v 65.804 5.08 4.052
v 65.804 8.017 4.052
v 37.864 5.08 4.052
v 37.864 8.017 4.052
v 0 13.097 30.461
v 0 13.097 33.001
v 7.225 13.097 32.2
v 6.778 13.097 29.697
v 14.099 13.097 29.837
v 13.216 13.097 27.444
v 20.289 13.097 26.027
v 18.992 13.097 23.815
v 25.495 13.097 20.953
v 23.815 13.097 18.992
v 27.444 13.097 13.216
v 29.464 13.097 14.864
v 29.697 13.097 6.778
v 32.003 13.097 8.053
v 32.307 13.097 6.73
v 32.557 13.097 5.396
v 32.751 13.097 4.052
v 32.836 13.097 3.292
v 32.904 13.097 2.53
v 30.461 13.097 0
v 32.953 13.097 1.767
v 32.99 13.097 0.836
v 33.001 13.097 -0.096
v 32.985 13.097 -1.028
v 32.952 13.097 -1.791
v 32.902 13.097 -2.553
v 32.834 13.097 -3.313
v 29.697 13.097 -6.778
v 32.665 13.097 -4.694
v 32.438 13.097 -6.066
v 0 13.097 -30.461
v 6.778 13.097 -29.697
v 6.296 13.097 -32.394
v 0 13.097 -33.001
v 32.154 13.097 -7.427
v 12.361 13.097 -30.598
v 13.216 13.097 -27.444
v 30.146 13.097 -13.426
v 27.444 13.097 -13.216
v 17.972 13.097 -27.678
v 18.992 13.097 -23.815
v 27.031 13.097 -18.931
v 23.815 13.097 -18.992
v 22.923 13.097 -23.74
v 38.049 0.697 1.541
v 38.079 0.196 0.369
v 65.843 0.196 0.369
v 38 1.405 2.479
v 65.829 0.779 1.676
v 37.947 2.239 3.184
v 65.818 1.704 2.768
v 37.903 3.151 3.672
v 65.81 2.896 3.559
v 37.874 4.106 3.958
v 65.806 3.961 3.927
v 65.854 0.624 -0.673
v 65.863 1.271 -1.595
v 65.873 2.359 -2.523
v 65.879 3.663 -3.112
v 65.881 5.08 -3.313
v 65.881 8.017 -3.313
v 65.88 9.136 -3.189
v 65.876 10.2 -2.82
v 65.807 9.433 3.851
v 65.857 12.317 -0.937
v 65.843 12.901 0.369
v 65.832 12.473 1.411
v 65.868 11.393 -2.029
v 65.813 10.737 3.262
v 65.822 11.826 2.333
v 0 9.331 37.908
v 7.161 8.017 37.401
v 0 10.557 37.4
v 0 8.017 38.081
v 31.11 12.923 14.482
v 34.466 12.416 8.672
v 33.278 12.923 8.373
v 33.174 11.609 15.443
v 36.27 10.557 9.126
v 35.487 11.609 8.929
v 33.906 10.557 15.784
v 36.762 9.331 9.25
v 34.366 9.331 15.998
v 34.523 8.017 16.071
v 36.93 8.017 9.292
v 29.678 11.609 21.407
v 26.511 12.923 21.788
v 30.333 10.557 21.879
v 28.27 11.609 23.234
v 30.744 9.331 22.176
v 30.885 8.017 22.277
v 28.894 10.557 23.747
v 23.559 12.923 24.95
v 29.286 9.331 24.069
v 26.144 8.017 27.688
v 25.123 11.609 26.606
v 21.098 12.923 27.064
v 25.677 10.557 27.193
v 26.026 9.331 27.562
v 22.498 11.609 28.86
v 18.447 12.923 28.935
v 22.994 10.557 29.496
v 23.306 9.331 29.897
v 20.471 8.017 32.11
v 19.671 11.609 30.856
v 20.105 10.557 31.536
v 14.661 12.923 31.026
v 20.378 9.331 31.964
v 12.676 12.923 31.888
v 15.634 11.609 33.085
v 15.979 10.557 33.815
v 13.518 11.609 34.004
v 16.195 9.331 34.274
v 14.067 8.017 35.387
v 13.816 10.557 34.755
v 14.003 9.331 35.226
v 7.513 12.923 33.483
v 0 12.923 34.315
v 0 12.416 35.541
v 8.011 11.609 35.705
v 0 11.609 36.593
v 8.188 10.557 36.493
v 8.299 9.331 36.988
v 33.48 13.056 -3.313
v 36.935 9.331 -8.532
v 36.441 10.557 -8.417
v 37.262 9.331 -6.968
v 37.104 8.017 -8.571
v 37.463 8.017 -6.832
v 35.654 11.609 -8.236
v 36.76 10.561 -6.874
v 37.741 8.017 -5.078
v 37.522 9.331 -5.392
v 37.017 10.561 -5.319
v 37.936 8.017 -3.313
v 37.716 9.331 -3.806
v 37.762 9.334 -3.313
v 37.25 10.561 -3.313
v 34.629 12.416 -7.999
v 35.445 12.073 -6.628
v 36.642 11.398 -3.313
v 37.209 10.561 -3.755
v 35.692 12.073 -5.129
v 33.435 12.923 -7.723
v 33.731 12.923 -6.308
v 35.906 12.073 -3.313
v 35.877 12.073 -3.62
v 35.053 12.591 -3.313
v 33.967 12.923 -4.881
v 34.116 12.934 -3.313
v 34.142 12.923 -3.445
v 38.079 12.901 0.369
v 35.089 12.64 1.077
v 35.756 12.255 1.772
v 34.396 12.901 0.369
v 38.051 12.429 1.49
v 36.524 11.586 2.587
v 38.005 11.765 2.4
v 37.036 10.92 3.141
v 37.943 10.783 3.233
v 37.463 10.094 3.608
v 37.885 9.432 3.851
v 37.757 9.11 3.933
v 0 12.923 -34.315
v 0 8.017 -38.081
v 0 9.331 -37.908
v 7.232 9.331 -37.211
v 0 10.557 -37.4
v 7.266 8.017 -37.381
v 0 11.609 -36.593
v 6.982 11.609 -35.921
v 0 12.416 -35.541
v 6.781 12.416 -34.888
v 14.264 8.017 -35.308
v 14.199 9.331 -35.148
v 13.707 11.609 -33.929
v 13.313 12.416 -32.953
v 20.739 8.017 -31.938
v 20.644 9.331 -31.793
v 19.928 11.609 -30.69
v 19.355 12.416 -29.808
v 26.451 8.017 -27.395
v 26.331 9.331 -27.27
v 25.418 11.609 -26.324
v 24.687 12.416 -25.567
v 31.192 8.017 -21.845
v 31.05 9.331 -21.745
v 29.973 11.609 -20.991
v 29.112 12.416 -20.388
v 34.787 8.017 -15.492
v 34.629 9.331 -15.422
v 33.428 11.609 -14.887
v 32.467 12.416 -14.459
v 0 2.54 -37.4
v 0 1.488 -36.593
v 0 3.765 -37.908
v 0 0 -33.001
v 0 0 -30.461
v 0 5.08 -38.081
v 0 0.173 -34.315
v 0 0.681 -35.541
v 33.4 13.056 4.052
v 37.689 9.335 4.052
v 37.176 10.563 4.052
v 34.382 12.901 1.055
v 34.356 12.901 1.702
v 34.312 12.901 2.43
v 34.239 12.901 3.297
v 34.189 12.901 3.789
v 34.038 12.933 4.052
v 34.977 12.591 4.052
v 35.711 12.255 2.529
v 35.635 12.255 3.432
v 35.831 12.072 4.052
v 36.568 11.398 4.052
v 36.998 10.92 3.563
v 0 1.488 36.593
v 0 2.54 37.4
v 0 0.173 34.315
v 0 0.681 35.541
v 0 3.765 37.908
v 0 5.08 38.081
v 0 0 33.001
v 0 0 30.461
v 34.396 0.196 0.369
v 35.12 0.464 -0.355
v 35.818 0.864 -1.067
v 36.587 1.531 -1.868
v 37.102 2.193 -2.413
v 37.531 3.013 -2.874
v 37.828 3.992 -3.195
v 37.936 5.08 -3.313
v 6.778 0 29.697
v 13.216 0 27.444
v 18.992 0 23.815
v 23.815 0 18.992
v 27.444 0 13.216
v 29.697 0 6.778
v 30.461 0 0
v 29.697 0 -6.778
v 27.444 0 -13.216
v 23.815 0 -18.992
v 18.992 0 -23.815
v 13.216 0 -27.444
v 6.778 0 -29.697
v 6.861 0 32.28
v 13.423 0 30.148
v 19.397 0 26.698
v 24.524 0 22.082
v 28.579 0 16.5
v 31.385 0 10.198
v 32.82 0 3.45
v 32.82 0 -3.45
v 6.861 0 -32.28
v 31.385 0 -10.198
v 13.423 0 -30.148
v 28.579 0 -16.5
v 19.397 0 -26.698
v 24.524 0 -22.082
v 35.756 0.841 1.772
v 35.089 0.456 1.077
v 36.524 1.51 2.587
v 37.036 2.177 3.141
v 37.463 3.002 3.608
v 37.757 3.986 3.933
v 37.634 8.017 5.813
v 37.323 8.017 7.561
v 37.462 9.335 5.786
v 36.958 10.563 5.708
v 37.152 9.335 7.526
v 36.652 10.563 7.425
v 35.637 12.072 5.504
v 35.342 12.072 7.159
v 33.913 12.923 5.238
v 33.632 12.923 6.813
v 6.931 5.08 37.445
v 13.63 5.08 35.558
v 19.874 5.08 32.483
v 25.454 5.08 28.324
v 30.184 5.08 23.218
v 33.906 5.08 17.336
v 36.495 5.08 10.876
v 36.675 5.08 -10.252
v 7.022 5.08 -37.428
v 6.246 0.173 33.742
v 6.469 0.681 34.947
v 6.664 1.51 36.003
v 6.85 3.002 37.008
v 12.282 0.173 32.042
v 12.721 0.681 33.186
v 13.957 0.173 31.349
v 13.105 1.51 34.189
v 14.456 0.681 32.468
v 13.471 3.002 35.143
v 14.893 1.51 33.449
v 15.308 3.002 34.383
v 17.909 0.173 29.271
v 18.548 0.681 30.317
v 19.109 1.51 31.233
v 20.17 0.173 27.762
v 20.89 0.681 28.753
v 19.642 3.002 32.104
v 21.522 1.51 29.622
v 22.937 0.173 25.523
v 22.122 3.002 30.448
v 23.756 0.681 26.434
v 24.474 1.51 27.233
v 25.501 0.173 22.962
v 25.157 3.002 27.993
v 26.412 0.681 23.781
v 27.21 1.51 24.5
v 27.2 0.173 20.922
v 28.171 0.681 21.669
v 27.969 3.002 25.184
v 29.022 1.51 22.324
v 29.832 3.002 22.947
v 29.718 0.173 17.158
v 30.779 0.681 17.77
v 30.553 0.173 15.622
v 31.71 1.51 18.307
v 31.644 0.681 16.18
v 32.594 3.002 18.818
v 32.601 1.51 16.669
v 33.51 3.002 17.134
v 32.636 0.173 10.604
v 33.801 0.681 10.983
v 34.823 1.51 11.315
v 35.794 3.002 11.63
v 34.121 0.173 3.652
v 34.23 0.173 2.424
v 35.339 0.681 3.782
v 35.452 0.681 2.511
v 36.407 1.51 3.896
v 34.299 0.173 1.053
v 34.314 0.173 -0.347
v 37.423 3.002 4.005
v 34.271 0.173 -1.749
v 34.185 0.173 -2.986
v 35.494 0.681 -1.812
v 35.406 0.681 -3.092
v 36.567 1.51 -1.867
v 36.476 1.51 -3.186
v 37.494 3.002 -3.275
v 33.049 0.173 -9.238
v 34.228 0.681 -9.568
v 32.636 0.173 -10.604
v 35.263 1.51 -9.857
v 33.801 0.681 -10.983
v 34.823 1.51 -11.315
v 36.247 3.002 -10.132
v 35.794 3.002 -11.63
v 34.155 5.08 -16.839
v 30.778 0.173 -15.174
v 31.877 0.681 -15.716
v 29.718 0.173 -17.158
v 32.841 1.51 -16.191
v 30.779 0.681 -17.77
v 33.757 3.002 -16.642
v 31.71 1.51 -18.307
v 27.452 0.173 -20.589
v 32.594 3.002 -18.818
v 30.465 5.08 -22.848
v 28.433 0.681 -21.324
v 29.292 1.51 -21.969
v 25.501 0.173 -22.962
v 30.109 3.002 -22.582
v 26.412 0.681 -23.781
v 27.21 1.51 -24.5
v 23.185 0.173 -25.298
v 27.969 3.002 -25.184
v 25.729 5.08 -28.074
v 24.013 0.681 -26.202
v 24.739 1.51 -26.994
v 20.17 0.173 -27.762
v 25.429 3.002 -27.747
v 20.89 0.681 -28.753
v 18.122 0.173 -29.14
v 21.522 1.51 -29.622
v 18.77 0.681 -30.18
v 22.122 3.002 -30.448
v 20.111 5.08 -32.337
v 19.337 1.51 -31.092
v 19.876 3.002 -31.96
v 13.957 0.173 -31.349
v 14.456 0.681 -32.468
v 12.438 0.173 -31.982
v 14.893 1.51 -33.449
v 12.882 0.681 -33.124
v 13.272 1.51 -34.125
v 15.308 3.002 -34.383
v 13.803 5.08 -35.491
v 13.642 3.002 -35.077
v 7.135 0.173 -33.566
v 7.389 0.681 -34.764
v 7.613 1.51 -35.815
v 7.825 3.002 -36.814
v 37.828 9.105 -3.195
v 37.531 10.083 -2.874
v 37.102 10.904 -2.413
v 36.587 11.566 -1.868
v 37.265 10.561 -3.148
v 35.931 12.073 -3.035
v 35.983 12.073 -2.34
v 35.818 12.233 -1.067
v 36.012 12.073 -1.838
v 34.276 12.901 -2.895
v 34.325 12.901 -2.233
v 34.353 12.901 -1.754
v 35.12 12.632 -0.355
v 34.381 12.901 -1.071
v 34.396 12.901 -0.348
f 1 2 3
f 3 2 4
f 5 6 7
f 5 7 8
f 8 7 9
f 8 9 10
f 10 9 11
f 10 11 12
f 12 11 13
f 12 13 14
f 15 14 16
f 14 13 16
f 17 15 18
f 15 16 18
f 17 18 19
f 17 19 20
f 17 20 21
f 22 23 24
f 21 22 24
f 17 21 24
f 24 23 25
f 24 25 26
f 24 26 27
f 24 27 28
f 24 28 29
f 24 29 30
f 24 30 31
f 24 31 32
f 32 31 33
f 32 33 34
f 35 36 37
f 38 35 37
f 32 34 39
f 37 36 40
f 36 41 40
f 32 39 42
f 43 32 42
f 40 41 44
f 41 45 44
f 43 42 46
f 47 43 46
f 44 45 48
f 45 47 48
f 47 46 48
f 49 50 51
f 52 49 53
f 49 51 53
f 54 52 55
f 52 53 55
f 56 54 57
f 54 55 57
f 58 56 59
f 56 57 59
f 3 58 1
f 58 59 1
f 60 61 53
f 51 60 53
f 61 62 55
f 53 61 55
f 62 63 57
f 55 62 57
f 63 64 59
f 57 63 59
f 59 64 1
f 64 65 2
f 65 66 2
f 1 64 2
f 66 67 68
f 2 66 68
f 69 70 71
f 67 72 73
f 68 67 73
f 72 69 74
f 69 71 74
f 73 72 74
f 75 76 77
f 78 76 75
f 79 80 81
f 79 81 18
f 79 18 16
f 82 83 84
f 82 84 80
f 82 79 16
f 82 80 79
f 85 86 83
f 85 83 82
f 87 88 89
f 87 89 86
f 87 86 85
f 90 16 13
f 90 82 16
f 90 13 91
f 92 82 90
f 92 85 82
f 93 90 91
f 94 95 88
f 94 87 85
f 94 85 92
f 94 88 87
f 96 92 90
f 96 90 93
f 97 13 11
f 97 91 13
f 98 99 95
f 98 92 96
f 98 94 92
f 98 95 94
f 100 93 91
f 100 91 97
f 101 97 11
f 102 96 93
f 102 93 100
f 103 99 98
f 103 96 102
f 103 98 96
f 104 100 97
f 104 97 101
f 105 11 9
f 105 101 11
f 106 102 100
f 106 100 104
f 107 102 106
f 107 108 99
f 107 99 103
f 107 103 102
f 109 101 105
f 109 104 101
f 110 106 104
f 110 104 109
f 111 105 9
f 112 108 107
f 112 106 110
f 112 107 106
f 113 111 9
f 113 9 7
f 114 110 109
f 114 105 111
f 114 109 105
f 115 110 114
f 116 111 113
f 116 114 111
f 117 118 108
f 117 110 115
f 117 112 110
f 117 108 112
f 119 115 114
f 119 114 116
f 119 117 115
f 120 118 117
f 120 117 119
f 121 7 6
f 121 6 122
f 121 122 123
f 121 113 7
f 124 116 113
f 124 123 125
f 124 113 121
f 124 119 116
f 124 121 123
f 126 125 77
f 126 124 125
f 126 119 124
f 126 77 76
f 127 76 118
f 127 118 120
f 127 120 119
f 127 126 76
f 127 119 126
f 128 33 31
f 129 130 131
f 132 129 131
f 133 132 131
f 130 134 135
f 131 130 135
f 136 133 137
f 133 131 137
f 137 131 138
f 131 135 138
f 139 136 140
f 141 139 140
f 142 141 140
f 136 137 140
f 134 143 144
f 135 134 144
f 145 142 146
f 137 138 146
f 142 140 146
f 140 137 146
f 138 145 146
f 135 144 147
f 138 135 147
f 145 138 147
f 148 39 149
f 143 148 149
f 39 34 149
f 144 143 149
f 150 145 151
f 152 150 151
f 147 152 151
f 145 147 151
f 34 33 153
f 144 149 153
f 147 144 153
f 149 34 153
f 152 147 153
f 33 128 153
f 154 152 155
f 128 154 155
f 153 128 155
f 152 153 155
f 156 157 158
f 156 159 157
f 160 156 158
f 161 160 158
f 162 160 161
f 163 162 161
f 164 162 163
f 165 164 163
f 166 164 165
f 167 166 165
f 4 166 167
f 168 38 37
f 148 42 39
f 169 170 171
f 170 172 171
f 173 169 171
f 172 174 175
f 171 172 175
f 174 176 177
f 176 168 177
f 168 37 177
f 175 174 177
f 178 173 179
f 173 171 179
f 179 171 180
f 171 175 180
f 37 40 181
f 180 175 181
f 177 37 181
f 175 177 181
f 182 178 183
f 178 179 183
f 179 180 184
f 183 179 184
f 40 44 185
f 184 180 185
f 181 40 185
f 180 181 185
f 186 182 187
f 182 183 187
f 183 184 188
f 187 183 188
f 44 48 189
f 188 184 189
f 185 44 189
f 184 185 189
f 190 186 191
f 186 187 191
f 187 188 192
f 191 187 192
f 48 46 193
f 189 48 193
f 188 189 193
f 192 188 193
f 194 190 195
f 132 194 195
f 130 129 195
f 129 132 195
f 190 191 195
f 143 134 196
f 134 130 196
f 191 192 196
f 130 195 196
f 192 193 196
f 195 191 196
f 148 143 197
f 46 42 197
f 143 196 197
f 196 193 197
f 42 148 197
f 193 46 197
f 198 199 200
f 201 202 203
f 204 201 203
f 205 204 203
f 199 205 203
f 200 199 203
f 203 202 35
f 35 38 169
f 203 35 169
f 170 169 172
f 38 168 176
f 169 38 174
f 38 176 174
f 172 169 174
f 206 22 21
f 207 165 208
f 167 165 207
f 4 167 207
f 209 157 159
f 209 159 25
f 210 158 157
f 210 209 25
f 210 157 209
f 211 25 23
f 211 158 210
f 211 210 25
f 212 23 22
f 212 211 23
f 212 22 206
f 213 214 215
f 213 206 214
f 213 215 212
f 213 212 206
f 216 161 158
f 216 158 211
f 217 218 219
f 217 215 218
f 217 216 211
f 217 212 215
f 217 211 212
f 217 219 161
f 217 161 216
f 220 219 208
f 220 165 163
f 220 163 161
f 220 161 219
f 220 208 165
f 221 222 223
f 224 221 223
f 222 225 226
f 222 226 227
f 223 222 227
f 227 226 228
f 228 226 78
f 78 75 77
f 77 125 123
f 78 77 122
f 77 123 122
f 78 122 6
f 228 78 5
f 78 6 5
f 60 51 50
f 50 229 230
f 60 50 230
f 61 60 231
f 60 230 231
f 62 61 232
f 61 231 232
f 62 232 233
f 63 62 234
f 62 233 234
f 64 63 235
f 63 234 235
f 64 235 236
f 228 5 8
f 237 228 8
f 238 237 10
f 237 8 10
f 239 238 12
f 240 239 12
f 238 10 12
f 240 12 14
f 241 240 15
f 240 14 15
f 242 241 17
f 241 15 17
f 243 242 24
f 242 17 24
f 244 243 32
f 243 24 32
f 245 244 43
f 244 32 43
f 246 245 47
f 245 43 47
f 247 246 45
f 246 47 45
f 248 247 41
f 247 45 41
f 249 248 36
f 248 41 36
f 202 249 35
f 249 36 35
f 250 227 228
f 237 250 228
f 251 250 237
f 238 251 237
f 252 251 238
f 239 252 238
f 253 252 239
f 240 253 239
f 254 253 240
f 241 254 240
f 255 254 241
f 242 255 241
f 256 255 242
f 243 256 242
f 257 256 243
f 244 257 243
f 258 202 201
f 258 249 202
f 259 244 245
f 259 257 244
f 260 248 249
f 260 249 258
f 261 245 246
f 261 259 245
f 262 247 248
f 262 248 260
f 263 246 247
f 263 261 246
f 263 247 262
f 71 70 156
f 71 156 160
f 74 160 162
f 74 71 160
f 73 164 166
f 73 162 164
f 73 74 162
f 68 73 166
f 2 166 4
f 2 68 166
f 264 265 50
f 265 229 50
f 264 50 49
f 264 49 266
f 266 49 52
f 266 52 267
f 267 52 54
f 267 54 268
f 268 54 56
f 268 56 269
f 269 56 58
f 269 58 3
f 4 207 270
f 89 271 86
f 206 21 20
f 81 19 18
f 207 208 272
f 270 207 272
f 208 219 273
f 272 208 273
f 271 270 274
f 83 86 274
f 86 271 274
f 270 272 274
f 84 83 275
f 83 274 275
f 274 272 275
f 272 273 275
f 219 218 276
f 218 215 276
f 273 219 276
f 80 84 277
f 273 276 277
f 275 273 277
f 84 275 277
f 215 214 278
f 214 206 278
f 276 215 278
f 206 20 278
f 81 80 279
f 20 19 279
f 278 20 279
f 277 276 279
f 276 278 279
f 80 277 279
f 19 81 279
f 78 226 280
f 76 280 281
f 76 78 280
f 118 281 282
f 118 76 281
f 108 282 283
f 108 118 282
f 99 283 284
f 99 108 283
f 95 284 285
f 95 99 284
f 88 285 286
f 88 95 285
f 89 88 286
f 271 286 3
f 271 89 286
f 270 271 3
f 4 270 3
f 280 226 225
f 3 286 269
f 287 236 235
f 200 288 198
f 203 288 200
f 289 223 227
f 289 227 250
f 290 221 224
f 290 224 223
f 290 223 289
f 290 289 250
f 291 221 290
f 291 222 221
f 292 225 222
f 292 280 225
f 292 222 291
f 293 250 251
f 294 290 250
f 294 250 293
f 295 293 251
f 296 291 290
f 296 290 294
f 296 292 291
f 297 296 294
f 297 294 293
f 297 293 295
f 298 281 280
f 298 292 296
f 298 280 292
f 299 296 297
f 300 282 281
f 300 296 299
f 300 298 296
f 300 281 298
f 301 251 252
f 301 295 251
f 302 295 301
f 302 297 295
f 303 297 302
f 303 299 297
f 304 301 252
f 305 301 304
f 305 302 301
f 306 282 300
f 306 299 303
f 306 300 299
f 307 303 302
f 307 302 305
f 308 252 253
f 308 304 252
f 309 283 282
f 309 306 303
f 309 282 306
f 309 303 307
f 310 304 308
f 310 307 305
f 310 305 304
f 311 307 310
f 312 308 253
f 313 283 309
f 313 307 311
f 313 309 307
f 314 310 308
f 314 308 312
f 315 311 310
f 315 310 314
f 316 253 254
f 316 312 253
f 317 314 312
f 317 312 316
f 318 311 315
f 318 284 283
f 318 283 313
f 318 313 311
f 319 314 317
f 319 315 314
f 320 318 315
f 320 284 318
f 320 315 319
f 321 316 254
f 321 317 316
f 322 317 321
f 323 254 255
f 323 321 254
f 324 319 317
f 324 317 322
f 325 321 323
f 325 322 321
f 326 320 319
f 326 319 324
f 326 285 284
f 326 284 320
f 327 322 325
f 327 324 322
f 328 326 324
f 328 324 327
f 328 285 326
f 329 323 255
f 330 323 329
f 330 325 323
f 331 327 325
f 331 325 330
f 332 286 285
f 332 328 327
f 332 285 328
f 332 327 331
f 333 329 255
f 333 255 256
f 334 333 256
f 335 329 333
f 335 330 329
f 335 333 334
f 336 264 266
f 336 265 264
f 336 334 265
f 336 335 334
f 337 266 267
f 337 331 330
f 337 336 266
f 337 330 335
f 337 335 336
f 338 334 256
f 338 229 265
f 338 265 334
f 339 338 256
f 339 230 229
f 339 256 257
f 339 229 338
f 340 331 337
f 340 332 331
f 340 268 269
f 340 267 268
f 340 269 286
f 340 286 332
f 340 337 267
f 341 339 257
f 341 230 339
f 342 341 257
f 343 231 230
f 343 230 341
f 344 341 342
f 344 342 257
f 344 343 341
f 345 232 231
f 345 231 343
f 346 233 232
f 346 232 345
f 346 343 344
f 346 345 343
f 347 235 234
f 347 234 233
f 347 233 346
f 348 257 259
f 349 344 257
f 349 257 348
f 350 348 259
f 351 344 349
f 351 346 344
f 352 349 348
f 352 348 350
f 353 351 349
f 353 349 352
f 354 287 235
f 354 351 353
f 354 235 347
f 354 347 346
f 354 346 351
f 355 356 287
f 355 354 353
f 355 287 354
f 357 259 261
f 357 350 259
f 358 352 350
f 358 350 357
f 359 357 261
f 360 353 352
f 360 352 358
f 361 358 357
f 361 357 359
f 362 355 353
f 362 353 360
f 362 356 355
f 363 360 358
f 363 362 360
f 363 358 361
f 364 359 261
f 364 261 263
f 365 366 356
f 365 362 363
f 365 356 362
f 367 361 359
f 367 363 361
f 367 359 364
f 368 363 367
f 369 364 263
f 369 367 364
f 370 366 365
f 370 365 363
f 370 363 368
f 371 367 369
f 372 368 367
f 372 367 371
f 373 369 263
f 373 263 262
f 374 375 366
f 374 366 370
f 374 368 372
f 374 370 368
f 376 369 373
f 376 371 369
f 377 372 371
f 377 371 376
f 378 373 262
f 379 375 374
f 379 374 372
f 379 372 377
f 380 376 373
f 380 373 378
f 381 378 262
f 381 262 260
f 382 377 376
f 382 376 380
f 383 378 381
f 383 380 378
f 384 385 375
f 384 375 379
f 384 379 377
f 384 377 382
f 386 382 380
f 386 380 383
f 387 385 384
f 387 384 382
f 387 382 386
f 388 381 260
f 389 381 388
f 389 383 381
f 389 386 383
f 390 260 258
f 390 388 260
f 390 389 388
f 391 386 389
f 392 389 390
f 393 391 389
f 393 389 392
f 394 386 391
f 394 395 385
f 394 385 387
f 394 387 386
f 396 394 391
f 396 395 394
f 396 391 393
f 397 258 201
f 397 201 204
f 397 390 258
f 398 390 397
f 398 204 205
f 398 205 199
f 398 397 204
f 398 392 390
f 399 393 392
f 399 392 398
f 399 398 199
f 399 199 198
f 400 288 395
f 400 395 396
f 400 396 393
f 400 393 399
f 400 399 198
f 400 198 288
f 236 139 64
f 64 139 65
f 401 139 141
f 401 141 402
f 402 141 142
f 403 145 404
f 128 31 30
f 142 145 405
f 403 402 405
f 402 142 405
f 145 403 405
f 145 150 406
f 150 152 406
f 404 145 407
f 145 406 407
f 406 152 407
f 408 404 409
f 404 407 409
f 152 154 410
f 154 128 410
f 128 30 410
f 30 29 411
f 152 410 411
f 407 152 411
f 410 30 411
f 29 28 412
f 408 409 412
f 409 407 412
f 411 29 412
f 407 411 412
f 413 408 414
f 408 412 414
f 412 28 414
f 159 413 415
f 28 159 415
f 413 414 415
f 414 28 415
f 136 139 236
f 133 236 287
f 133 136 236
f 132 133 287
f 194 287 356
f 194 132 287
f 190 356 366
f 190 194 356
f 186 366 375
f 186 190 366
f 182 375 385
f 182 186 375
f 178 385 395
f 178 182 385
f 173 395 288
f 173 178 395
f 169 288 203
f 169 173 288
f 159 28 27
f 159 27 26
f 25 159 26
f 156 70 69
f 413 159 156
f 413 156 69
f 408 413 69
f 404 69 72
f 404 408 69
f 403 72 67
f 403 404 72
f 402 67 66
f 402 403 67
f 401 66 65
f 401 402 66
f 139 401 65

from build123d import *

# Parameters (mm, degrees)
F3_T3_DEPTH  = 53.34
F3_S4_R      = 38.080648574
F3_T5_DEPTH  = 28
F3_T8_ANGLE  = 123.2386530656
F3_T12_ANGLE = 123.2386530656
F3_T16_ANGLE = 122.1214906001
F3_T20_ANGLE = 122.1214906001
F3_T24_DEPTH = 53.34
F3_S25_R     = 38.080648574
F3_T26_DEPTH = 28
F3_T29_ANGLE = 123.2386530656
F3_T33_ANGLE = 123.2386530656
F3_T37_ANGLE = 122.1214906001
F3_T41_ANGLE = 122.1214906001
F3_T45_DEPTH = 53.3452335571
F3_S46_R     = 38.080648574
F3_T47_DEPTH = 28
F3_T50_DEPTH = 53.3452335571
F3_S51_R     = 38.080648574
F3_T52_DEPTH = 28
F3_T56_DEPTH = 53.34
F3_S57_R     = 38.080648574
F3_T58_DEPTH = 28
F3_T61_ANGLE = 122.1214906001
F3_T68_ANGLE = 123.2386530656
F3_T73_DEPTH = 53.3452335571
F3_S74_R     = 38.080648574
F3_T75_DEPTH = 28
F3_T80_DEPTH = 53.34
F3_S81_R     = 38.080648574
F3_T82_DEPTH = 28
F3_T85_ANGLE = 122.1214906001
F3_T92_ANGLE = 123.2386530656
F3_T97_DEPTH = 53.3452335571
F3_S98_R     = 38.080648574
F3_T99_DEPTH = 28


# Not quite as in the source:
# - a fillet or chamfer that OpenCascade refuses, or shapes differently, is made with other operations: its cross-section is extruded or revolved along the edge and cut away or added


with BuildPart() as f2:
    # F2: sweep along a path in F1
    with BuildLine(Plane.YZ) as f2_path:
        Line((0, 0), (13.0965914577, 0))
    # F0 (on Front) → F2 (sweep)
    with BuildSketch(Plane.XZ):
        with BuildLine():
            ThreePointArc((37.8644369888, 4.0521855022), (38.0788400668, 0.3711266463), (37.9362240869, -3.3134118136))
            Line((37.9362240869, -3.3134118136), (65.8814576441, -3.3134118136))
            Line((65.8814576441, -3.3134118136), (65.8044369888, 4.0521855022))
            Line((65.8044369888, 4.0521855022), (37.8644369888, 4.0521855022))
        make_face()
        with BuildLine():
            Line((0, -30.460648574), (0, -38.080648574))
            ThreePointArc((0, -38.080648574), (25.7289615508, -28.0741221294), (37.9362240869, -3.3134118136))
            ThreePointArc((37.9362240869, -3.3134118136), (38.0788400668, 0.3711266463), (37.8644369888, 4.0521855022))
            ThreePointArc((37.8644369888, 4.0521855022), (25.4541346716, 28.3235383373), (0, 38.080648574))
            Line((0, 38.080648574), (0, 30.460648574))
            ThreePointArc((0, 30.460648574), (30.460648574, 0), (0, -30.460648574))
        make_face()
    sweep(path=f2_path.line)

    # F3: fillet of radius 5.08 on 8 edges, made by hand


with BuildPart() as f3_tool1:
    # F3_s2 → F3_t3 (new body)
    with BuildSketch(Plane.YZ.offset(78.5044369888)):
        with BuildLine():
            ThreePointArc((0, -1.0278144978), (1.4878975516, 2.5642879506), (5.08, 4.0521855022))
            Line((5.08, 4.0521855022), (0, 4.0521855022))
            Line((0, 4.0521855022), (0, -1.0278144978))
        make_face()
    extrude(amount=-F3_T3_DEPTH)

    # F3_s4 → F3_t5 (cut, symmetric)
    with BuildSketch(Plane.XZ.offset(-2.5)):
        Circle(F3_S4_R)
    extrude(amount=F3_T5_DEPTH, both=True, mode=Mode.SUBTRACT)


with BuildPart() as f3_tool6:
    # F3_s7 → F3_t8 (revolve)
    with BuildSketch(Plane(origin=(0, 0, 0), x_dir=(0, 1, 0), z_dir=(-0.2440128994, 0, 0.969771986))):
        with BuildLine():
            ThreePointArc((0, -33.000648574), (1.4878975516, -36.5927510225), (5.08, -38.080648574))
            Line((5.08, -38.080648574), (0, -38.080648574))
            Line((0, -38.080648574), (0, -33.000648574))
        make_face()
    revolve(axis=Axis((0, 0, 0), (0, 1, 0)), revolution_arc=F3_T8_ANGLE)

    split(bisect_by=Plane.XY.offset(4.0521855022), keep=Keep.TOP)


with BuildPart() as f3_tool10:
    # F3_s11 → F3_t12 (revolve)
    with BuildSketch(Plane(origin=(0, 0, 0), x_dir=(0, 1, 0), z_dir=(-0.2440128994, 0, 0.969771986))):
        with BuildLine():
            ThreePointArc((0, -33.000648574), (1.4878975516, -36.5927510225), (5.08, -38.080648574))
            Line((5.08, -38.080648574), (0, -38.080648574))
            Line((0, -38.080648574), (0, -33.000648574))
        make_face()
    revolve(axis=Axis((0, 0, 0), (0, 1, 0)), revolution_arc=F3_T12_ANGLE)

    split(bisect_by=Plane.XY.offset(-3.3134118136), keep=Keep.BOTTOM)


with BuildPart() as f3_tool14:
    # F3_s15 → F3_t16 (revolve)
    with BuildSketch(Plane(origin=(0, 0, 0), x_dir=(0, 1, 0), z_dir=(-0.9448633995, 0, -0.3274647406))):
        with BuildLine():
            ThreePointArc((0, -33.000648574), (1.4878975516, -36.5927510225), (5.08, -38.080648574))
            Line((5.08, -38.080648574), (0, -38.080648574))
            Line((0, -38.080648574), (0, -33.000648574))
        make_face()
    revolve(axis=Axis((0, 0, 0), (0, 1, 0)), revolution_arc=F3_T16_ANGLE)

    split(bisect_by=Plane.XY.offset(4.0521855022), keep=Keep.TOP)


with BuildPart() as f3_tool18:
    # F3_s19 → F3_t20 (revolve)
    with BuildSketch(Plane(origin=(0, 0, 0), x_dir=(0, 1, 0), z_dir=(-0.9448633995, 0, -0.3274647406))):
        with BuildLine():
            ThreePointArc((0, -33.000648574), (1.4878975516, -36.5927510225), (5.08, -38.080648574))
            Line((5.08, -38.080648574), (0, -38.080648574))
            Line((0, -38.080648574), (0, -33.000648574))
        make_face()
    revolve(axis=Axis((0, 0, 0), (0, 1, 0)), revolution_arc=F3_T20_ANGLE)

    split(bisect_by=Plane.XY.offset(-3.3134118136), keep=Keep.BOTTOM)


with BuildPart() as f3_tool22:
    # F3_s23 → F3_t24 (new body)
    with BuildSketch(Plane.YZ.offset(78.5044369888)):
        with BuildLine():
            ThreePointArc((13.0965914577, -1.0278144978), (11.6086939062, 2.5642879506), (8.0165914577, 4.0521855022))
            Line((8.0165914577, 4.0521855022), (13.0965914577, 4.0521855022))
            Line((13.0965914577, 4.0521855022), (13.0965914577, -1.0278144978))
        make_face()
    extrude(amount=-F3_T24_DEPTH)

    # F3_s25 → F3_t26 (cut, symmetric)
    with BuildSketch(Plane.XZ.offset(-10.6)):
        Circle(F3_S25_R)
    extrude(amount=F3_T26_DEPTH, both=True, mode=Mode.SUBTRACT)


with BuildPart() as f3_tool27:
    # F3_s28 → F3_t29 (revolve)
    with BuildSketch(Plane(origin=(0, 0, 0), x_dir=(0, 1, 0), z_dir=(-0.9448623776, 0, 0.3274676891))):
        with BuildLine():
            ThreePointArc((8.0165914577, 38.080648574), (11.6086939062, 36.5927510225), (13.0965914577, 33.000648574))
            Line((13.0965914577, 33.000648574), (13.0965914577, 38.080648574))
            Line((13.0965914577, 38.080648574), (8.0165914577, 38.080648574))
        make_face()
    revolve(axis=Axis((0, 13.0965914577, 0), (0, -1, 0)), revolution_arc=F3_T29_ANGLE)

    split(bisect_by=Plane.XY.offset(-3.3134118136), keep=Keep.BOTTOM)


with BuildPart() as f3_tool31:
    # F3_s32 → F3_t33 (revolve)
    with BuildSketch(Plane(origin=(0, 0, 0), x_dir=(0, 1, 0), z_dir=(-0.9448623776, 0, 0.3274676891))):
        with BuildLine():
            ThreePointArc((8.0165914577, 38.080648574), (11.6086939062, 36.5927510225), (13.0965914577, 33.000648574))
            Line((13.0965914577, 33.000648574), (13.0965914577, 38.080648574))
            Line((13.0965914577, 38.080648574), (8.0165914577, 38.080648574))
        make_face()
    revolve(axis=Axis((0, 13.0965914577, 0), (0, -1, 0)), revolution_arc=F3_T33_ANGLE)

    split(bisect_by=Plane.XY.offset(4.0521855022), keep=Keep.TOP)


with BuildPart() as f3_tool35:
    # F3_s36 → F3_t37 (revolve)
    with BuildSketch(Plane(origin=(0, 0, 0), x_dir=(0, 1, 0), z_dir=(-0.2250619827, 0, -0.9743444483))):
        with BuildLine():
            ThreePointArc((13.0965914577, 33.000648574), (11.6086939062, 36.5927510225), (8.0165914577, 38.080648574))
            Line((8.0165914577, 38.080648574), (13.0965914577, 38.080648574))
            Line((13.0965914577, 38.080648574), (13.0965914577, 33.000648574))
        make_face()
    revolve(axis=Axis((0, 13.0965914577, 0), (0, -1, 0)), revolution_arc=F3_T37_ANGLE)

    split(bisect_by=Plane.XY.offset(-3.3134118136), keep=Keep.BOTTOM)


with BuildPart() as f3_tool39:
    # F3_s40 → F3_t41 (revolve)
    with BuildSketch(Plane(origin=(0, 0, 0), x_dir=(0, 1, 0), z_dir=(-0.2250619827, 0, -0.9743444483))):
        with BuildLine():
            ThreePointArc((13.0965914577, 33.000648574), (11.6086939062, 36.5927510225), (8.0165914577, 38.080648574))
            Line((8.0165914577, 38.080648574), (13.0965914577, 38.080648574))
            Line((13.0965914577, 38.080648574), (13.0965914577, 33.000648574))
        make_face()
    revolve(axis=Axis((0, 13.0965914577, 0), (0, -1, 0)), revolution_arc=F3_T41_ANGLE)

    split(bisect_by=Plane.XY.offset(4.0521855022), keep=Keep.TOP)


with BuildPart() as f3_tool43:
    # F3_s44 → F3_t45 (new body)
    with BuildSketch(Plane.YZ.offset(25.2362240869)):
        with BuildLine():
            ThreePointArc((13.0965914577, 1.7665881864), (11.6086939062, -1.8255142621), (8.0165914577, -3.3134118136))
            Line((8.0165914577, -3.3134118136), (13.0965914577, -3.3134118136))
            Line((13.0965914577, -3.3134118136), (13.0965914577, 1.7665881864))
        make_face()
    extrude(amount=F3_T45_DEPTH)

    # F3_s46 → F3_t47 (cut, symmetric)
    with BuildSketch(Plane.XZ.offset(-10.6)):
        Circle(F3_S46_R)
    extrude(amount=F3_T47_DEPTH, both=True, mode=Mode.SUBTRACT)


with BuildPart() as f3_tool48:
    # F3_s49 → F3_t50 (new body)
    with BuildSketch(Plane.YZ.offset(25.2362240869)):
        with BuildLine():
            ThreePointArc((0, 1.7665881864), (1.4878975516, -1.8255142621), (5.08, -3.3134118136))
            Line((5.08, -3.3134118136), (0, -3.3134118136))
            Line((0, -3.3134118136), (0, 1.7665881864))
        make_face()
    extrude(amount=F3_T50_DEPTH)

    # F3_s51 → F3_t52 (cut, symmetric)
    with BuildSketch(Plane.XZ.offset(-2.5)):
        Circle(F3_S51_R)
    extrude(amount=F3_T52_DEPTH, both=True, mode=Mode.SUBTRACT)


with BuildPart() as f3_tool54:
    # F3_s55 → F3_t56 (new body)
    with BuildSketch(Plane.YZ.offset(78.5044369888)):
        with BuildLine():
            ThreePointArc((0, -1.0278144978), (1.4878975516, 2.5642879506), (5.08, 4.0521855022))
            Line((5.08, 4.0521855022), (0, 4.0521855022))
            Line((0, 4.0521855022), (0, -1.0278144978))
        make_face()
    extrude(amount=-F3_T56_DEPTH)

    # F3_s57 → F3_t58 (intersect, symmetric)
    with BuildSketch(Plane.XZ.offset(-2.5)):
        Circle(F3_S57_R)
    extrude(amount=F3_T58_DEPTH, both=True, mode=Mode.INTERSECT)


with BuildPart() as f3_tool59:
    # F3_s60 → F3_t61 (revolve)
    with BuildSketch(Plane(origin=(0, 0, 0), x_dir=(0, 1, 0), z_dir=(-0.9448633995, 0, -0.3274647406))):
        with BuildLine():
            ThreePointArc((0, -33.000648574), (1.4878975516, -36.5927510225), (5.08, -38.080648574))
            Line((5.08, -38.080648574), (0, -38.080648574))
            Line((0, -38.080648574), (0, -33.000648574))
        make_face()
    revolve(axis=Axis((0, 0, 0), (0, 1, 0)), revolution_arc=F3_T61_ANGLE)

    split(bisect_by=Plane.XY.offset(-3.3134118136), keep=Keep.TOP)

    split(bisect_by=Plane.XY.offset(4.0521855022), keep=Keep.BOTTOM)


with BuildPart() as f3_tool54_1:
    add(f3_tool54.part)

    # F3_t64: intersect F3_tool59
    add(f3_tool59.part, mode=Mode.INTERSECT)


with BuildPart() as f3_tool66:
    # F3_s67 → F3_t68 (revolve)
    with BuildSketch(Plane(origin=(0, 0, 0), x_dir=(0, 1, 0), z_dir=(-0.2440128994, 0, 0.969771986))):
        with BuildLine():
            ThreePointArc((0, -33.000648574), (1.4878975516, -36.5927510225), (5.08, -38.080648574))
            Line((5.08, -38.080648574), (0, -38.080648574))
            Line((0, -38.080648574), (0, -33.000648574))
        make_face()
    revolve(axis=Axis((0, 0, 0), (0, 1, 0)), revolution_arc=F3_T68_ANGLE)

    split(bisect_by=Plane.XY.offset(-3.3134118136), keep=Keep.TOP)

    split(bisect_by=Plane.XY.offset(4.0521855022), keep=Keep.BOTTOM)


with BuildPart() as f3_tool71:
    # F3_s72 → F3_t73 (new body)
    with BuildSketch(Plane.YZ.offset(25.2362240869)):
        with BuildLine():
            ThreePointArc((0, 1.7665881864), (1.4878975516, -1.8255142621), (5.08, -3.3134118136))
            Line((5.08, -3.3134118136), (0, -3.3134118136))
            Line((0, -3.3134118136), (0, 1.7665881864))
        make_face()
    extrude(amount=F3_T73_DEPTH)

    # F3_s74 → F3_t75 (intersect, symmetric)
    with BuildSketch(Plane.XZ.offset(-2.5)):
        Circle(F3_S74_R)
    extrude(amount=F3_T75_DEPTH, both=True, mode=Mode.INTERSECT)


with BuildPart() as f3_tool66_1:
    add(f3_tool66.part)

    # F3_t76: intersect F3_tool71
    add(f3_tool71.part, mode=Mode.INTERSECT)


with BuildPart() as f3_tool78:
    # F3_s79 → F3_t80 (new body)
    with BuildSketch(Plane.YZ.offset(78.5044369888)):
        with BuildLine():
            ThreePointArc((13.0965914577, -1.0278144978), (11.6086939062, 2.5642879506), (8.0165914577, 4.0521855022))
            Line((8.0165914577, 4.0521855022), (13.0965914577, 4.0521855022))
            Line((13.0965914577, 4.0521855022), (13.0965914577, -1.0278144978))
        make_face()
    extrude(amount=-F3_T80_DEPTH)

    # F3_s81 → F3_t82 (intersect, symmetric)
    with BuildSketch(Plane.XZ.offset(-10.6)):
        Circle(F3_S81_R)
    extrude(amount=F3_T82_DEPTH, both=True, mode=Mode.INTERSECT)


with BuildPart() as f3_tool83:
    # F3_s84 → F3_t85 (revolve)
    with BuildSketch(Plane(origin=(0, 0, 0), x_dir=(0, 1, 0), z_dir=(-0.2250619827, 0, -0.9743444483))):
        with BuildLine():
            ThreePointArc((13.0965914577, 33.000648574), (11.6086939062, 36.5927510225), (8.0165914577, 38.080648574))
            Line((8.0165914577, 38.080648574), (13.0965914577, 38.080648574))
            Line((13.0965914577, 38.080648574), (13.0965914577, 33.000648574))
        make_face()
    revolve(axis=Axis((0, 13.0965914577, 0), (0, -1, 0)), revolution_arc=F3_T85_ANGLE)

    split(bisect_by=Plane.XY.offset(-3.3134118136), keep=Keep.TOP)

    split(bisect_by=Plane.XY.offset(4.0521855022), keep=Keep.BOTTOM)


with BuildPart() as f3_tool78_1:
    add(f3_tool78.part)

    # F3_t88: intersect F3_tool83
    add(f3_tool83.part, mode=Mode.INTERSECT)


with BuildPart() as f3_tool90:
    # F3_s91 → F3_t92 (revolve)
    with BuildSketch(Plane(origin=(0, 0, 0), x_dir=(0, 1, 0), z_dir=(-0.9448623776, 0, 0.3274676891))):
        with BuildLine():
            ThreePointArc((8.0165914577, 38.080648574), (11.6086939062, 36.5927510225), (13.0965914577, 33.000648574))
            Line((13.0965914577, 33.000648574), (13.0965914577, 38.080648574))
            Line((13.0965914577, 38.080648574), (8.0165914577, 38.080648574))
        make_face()
    revolve(axis=Axis((0, 13.0965914577, 0), (0, -1, 0)), revolution_arc=F3_T92_ANGLE)

    split(bisect_by=Plane.XY.offset(-3.3134118136), keep=Keep.TOP)

    split(bisect_by=Plane.XY.offset(4.0521855022), keep=Keep.BOTTOM)


with BuildPart() as f3_tool95:
    # F3_s96 → F3_t97 (new body)
    with BuildSketch(Plane.YZ.offset(25.2362240869)):
        with BuildLine():
            ThreePointArc((13.0965914577, 1.7665881864), (11.6086939062, -1.8255142621), (8.0165914577, -3.3134118136))
            Line((8.0165914577, -3.3134118136), (13.0965914577, -3.3134118136))
            Line((13.0965914577, -3.3134118136), (13.0965914577, 1.7665881864))
        make_face()
    extrude(amount=F3_T97_DEPTH)

    # F3_s98 → F3_t99 (intersect, symmetric)
    with BuildSketch(Plane.XZ.offset(-10.6)):
        Circle(F3_S98_R)
    extrude(amount=F3_T99_DEPTH, both=True, mode=Mode.INTERSECT)


with BuildPart() as f3_tool90_1:
    add(f3_tool90.part)

    # F3_t100: intersect F3_tool95
    add(f3_tool95.part, mode=Mode.INTERSECT)


with BuildPart() as f2_1:
    add(f2.part)

    # F3_t101: cut F3_tool1, F3_tool6, F3_tool10, F3_tool14, F3_tool18, F3_tool22, F3_tool27, F3_tool31, F3_tool35, F3_tool39, F3_tool43, F3_tool48, F3_tool54, F3_tool66, F3_tool78, F3_tool90
    add([f3_tool1.part, f3_tool6.part, f3_tool10.part, f3_tool14.part, f3_tool18.part, f3_tool22.part, f3_tool27.part, f3_tool31.part, f3_tool35.part, f3_tool39.part, f3_tool43.part, f3_tool48.part, f3_tool54_1.part, f3_tool66_1.part, f3_tool78_1.part, f3_tool90_1.part], mode=Mode.SUBTRACT)


solid = f2_1.part
